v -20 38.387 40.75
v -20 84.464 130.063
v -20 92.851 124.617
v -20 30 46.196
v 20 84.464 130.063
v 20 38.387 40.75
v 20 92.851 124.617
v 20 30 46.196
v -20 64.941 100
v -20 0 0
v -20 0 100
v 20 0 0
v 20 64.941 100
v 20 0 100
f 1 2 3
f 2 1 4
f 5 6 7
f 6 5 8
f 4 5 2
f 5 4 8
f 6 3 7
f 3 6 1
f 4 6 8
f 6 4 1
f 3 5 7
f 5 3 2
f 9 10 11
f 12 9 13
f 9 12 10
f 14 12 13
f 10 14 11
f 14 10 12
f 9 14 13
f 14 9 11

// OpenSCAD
union()  {
translate([0.0,30.0,46.19594891443747])rotate([57.0,0.0,0.0])  translate([-20.0,0.0,-10.0])scale([1.0,1.0,1.0])rotate([0.0,0.0,0.0])  cube([40.0,100.0,10.0]);
translate([-20.0,0.0,100.0])scale([1.0,1.0,1.0])rotate([0.0,0.0,0.0])  rotate([90.0,90.0,90.0])  linear_extrude(height =40.0)  polygon(
points = [[0.0,0.0],[100.0,0.0],[0.0,64.94075931975104]]);
}
